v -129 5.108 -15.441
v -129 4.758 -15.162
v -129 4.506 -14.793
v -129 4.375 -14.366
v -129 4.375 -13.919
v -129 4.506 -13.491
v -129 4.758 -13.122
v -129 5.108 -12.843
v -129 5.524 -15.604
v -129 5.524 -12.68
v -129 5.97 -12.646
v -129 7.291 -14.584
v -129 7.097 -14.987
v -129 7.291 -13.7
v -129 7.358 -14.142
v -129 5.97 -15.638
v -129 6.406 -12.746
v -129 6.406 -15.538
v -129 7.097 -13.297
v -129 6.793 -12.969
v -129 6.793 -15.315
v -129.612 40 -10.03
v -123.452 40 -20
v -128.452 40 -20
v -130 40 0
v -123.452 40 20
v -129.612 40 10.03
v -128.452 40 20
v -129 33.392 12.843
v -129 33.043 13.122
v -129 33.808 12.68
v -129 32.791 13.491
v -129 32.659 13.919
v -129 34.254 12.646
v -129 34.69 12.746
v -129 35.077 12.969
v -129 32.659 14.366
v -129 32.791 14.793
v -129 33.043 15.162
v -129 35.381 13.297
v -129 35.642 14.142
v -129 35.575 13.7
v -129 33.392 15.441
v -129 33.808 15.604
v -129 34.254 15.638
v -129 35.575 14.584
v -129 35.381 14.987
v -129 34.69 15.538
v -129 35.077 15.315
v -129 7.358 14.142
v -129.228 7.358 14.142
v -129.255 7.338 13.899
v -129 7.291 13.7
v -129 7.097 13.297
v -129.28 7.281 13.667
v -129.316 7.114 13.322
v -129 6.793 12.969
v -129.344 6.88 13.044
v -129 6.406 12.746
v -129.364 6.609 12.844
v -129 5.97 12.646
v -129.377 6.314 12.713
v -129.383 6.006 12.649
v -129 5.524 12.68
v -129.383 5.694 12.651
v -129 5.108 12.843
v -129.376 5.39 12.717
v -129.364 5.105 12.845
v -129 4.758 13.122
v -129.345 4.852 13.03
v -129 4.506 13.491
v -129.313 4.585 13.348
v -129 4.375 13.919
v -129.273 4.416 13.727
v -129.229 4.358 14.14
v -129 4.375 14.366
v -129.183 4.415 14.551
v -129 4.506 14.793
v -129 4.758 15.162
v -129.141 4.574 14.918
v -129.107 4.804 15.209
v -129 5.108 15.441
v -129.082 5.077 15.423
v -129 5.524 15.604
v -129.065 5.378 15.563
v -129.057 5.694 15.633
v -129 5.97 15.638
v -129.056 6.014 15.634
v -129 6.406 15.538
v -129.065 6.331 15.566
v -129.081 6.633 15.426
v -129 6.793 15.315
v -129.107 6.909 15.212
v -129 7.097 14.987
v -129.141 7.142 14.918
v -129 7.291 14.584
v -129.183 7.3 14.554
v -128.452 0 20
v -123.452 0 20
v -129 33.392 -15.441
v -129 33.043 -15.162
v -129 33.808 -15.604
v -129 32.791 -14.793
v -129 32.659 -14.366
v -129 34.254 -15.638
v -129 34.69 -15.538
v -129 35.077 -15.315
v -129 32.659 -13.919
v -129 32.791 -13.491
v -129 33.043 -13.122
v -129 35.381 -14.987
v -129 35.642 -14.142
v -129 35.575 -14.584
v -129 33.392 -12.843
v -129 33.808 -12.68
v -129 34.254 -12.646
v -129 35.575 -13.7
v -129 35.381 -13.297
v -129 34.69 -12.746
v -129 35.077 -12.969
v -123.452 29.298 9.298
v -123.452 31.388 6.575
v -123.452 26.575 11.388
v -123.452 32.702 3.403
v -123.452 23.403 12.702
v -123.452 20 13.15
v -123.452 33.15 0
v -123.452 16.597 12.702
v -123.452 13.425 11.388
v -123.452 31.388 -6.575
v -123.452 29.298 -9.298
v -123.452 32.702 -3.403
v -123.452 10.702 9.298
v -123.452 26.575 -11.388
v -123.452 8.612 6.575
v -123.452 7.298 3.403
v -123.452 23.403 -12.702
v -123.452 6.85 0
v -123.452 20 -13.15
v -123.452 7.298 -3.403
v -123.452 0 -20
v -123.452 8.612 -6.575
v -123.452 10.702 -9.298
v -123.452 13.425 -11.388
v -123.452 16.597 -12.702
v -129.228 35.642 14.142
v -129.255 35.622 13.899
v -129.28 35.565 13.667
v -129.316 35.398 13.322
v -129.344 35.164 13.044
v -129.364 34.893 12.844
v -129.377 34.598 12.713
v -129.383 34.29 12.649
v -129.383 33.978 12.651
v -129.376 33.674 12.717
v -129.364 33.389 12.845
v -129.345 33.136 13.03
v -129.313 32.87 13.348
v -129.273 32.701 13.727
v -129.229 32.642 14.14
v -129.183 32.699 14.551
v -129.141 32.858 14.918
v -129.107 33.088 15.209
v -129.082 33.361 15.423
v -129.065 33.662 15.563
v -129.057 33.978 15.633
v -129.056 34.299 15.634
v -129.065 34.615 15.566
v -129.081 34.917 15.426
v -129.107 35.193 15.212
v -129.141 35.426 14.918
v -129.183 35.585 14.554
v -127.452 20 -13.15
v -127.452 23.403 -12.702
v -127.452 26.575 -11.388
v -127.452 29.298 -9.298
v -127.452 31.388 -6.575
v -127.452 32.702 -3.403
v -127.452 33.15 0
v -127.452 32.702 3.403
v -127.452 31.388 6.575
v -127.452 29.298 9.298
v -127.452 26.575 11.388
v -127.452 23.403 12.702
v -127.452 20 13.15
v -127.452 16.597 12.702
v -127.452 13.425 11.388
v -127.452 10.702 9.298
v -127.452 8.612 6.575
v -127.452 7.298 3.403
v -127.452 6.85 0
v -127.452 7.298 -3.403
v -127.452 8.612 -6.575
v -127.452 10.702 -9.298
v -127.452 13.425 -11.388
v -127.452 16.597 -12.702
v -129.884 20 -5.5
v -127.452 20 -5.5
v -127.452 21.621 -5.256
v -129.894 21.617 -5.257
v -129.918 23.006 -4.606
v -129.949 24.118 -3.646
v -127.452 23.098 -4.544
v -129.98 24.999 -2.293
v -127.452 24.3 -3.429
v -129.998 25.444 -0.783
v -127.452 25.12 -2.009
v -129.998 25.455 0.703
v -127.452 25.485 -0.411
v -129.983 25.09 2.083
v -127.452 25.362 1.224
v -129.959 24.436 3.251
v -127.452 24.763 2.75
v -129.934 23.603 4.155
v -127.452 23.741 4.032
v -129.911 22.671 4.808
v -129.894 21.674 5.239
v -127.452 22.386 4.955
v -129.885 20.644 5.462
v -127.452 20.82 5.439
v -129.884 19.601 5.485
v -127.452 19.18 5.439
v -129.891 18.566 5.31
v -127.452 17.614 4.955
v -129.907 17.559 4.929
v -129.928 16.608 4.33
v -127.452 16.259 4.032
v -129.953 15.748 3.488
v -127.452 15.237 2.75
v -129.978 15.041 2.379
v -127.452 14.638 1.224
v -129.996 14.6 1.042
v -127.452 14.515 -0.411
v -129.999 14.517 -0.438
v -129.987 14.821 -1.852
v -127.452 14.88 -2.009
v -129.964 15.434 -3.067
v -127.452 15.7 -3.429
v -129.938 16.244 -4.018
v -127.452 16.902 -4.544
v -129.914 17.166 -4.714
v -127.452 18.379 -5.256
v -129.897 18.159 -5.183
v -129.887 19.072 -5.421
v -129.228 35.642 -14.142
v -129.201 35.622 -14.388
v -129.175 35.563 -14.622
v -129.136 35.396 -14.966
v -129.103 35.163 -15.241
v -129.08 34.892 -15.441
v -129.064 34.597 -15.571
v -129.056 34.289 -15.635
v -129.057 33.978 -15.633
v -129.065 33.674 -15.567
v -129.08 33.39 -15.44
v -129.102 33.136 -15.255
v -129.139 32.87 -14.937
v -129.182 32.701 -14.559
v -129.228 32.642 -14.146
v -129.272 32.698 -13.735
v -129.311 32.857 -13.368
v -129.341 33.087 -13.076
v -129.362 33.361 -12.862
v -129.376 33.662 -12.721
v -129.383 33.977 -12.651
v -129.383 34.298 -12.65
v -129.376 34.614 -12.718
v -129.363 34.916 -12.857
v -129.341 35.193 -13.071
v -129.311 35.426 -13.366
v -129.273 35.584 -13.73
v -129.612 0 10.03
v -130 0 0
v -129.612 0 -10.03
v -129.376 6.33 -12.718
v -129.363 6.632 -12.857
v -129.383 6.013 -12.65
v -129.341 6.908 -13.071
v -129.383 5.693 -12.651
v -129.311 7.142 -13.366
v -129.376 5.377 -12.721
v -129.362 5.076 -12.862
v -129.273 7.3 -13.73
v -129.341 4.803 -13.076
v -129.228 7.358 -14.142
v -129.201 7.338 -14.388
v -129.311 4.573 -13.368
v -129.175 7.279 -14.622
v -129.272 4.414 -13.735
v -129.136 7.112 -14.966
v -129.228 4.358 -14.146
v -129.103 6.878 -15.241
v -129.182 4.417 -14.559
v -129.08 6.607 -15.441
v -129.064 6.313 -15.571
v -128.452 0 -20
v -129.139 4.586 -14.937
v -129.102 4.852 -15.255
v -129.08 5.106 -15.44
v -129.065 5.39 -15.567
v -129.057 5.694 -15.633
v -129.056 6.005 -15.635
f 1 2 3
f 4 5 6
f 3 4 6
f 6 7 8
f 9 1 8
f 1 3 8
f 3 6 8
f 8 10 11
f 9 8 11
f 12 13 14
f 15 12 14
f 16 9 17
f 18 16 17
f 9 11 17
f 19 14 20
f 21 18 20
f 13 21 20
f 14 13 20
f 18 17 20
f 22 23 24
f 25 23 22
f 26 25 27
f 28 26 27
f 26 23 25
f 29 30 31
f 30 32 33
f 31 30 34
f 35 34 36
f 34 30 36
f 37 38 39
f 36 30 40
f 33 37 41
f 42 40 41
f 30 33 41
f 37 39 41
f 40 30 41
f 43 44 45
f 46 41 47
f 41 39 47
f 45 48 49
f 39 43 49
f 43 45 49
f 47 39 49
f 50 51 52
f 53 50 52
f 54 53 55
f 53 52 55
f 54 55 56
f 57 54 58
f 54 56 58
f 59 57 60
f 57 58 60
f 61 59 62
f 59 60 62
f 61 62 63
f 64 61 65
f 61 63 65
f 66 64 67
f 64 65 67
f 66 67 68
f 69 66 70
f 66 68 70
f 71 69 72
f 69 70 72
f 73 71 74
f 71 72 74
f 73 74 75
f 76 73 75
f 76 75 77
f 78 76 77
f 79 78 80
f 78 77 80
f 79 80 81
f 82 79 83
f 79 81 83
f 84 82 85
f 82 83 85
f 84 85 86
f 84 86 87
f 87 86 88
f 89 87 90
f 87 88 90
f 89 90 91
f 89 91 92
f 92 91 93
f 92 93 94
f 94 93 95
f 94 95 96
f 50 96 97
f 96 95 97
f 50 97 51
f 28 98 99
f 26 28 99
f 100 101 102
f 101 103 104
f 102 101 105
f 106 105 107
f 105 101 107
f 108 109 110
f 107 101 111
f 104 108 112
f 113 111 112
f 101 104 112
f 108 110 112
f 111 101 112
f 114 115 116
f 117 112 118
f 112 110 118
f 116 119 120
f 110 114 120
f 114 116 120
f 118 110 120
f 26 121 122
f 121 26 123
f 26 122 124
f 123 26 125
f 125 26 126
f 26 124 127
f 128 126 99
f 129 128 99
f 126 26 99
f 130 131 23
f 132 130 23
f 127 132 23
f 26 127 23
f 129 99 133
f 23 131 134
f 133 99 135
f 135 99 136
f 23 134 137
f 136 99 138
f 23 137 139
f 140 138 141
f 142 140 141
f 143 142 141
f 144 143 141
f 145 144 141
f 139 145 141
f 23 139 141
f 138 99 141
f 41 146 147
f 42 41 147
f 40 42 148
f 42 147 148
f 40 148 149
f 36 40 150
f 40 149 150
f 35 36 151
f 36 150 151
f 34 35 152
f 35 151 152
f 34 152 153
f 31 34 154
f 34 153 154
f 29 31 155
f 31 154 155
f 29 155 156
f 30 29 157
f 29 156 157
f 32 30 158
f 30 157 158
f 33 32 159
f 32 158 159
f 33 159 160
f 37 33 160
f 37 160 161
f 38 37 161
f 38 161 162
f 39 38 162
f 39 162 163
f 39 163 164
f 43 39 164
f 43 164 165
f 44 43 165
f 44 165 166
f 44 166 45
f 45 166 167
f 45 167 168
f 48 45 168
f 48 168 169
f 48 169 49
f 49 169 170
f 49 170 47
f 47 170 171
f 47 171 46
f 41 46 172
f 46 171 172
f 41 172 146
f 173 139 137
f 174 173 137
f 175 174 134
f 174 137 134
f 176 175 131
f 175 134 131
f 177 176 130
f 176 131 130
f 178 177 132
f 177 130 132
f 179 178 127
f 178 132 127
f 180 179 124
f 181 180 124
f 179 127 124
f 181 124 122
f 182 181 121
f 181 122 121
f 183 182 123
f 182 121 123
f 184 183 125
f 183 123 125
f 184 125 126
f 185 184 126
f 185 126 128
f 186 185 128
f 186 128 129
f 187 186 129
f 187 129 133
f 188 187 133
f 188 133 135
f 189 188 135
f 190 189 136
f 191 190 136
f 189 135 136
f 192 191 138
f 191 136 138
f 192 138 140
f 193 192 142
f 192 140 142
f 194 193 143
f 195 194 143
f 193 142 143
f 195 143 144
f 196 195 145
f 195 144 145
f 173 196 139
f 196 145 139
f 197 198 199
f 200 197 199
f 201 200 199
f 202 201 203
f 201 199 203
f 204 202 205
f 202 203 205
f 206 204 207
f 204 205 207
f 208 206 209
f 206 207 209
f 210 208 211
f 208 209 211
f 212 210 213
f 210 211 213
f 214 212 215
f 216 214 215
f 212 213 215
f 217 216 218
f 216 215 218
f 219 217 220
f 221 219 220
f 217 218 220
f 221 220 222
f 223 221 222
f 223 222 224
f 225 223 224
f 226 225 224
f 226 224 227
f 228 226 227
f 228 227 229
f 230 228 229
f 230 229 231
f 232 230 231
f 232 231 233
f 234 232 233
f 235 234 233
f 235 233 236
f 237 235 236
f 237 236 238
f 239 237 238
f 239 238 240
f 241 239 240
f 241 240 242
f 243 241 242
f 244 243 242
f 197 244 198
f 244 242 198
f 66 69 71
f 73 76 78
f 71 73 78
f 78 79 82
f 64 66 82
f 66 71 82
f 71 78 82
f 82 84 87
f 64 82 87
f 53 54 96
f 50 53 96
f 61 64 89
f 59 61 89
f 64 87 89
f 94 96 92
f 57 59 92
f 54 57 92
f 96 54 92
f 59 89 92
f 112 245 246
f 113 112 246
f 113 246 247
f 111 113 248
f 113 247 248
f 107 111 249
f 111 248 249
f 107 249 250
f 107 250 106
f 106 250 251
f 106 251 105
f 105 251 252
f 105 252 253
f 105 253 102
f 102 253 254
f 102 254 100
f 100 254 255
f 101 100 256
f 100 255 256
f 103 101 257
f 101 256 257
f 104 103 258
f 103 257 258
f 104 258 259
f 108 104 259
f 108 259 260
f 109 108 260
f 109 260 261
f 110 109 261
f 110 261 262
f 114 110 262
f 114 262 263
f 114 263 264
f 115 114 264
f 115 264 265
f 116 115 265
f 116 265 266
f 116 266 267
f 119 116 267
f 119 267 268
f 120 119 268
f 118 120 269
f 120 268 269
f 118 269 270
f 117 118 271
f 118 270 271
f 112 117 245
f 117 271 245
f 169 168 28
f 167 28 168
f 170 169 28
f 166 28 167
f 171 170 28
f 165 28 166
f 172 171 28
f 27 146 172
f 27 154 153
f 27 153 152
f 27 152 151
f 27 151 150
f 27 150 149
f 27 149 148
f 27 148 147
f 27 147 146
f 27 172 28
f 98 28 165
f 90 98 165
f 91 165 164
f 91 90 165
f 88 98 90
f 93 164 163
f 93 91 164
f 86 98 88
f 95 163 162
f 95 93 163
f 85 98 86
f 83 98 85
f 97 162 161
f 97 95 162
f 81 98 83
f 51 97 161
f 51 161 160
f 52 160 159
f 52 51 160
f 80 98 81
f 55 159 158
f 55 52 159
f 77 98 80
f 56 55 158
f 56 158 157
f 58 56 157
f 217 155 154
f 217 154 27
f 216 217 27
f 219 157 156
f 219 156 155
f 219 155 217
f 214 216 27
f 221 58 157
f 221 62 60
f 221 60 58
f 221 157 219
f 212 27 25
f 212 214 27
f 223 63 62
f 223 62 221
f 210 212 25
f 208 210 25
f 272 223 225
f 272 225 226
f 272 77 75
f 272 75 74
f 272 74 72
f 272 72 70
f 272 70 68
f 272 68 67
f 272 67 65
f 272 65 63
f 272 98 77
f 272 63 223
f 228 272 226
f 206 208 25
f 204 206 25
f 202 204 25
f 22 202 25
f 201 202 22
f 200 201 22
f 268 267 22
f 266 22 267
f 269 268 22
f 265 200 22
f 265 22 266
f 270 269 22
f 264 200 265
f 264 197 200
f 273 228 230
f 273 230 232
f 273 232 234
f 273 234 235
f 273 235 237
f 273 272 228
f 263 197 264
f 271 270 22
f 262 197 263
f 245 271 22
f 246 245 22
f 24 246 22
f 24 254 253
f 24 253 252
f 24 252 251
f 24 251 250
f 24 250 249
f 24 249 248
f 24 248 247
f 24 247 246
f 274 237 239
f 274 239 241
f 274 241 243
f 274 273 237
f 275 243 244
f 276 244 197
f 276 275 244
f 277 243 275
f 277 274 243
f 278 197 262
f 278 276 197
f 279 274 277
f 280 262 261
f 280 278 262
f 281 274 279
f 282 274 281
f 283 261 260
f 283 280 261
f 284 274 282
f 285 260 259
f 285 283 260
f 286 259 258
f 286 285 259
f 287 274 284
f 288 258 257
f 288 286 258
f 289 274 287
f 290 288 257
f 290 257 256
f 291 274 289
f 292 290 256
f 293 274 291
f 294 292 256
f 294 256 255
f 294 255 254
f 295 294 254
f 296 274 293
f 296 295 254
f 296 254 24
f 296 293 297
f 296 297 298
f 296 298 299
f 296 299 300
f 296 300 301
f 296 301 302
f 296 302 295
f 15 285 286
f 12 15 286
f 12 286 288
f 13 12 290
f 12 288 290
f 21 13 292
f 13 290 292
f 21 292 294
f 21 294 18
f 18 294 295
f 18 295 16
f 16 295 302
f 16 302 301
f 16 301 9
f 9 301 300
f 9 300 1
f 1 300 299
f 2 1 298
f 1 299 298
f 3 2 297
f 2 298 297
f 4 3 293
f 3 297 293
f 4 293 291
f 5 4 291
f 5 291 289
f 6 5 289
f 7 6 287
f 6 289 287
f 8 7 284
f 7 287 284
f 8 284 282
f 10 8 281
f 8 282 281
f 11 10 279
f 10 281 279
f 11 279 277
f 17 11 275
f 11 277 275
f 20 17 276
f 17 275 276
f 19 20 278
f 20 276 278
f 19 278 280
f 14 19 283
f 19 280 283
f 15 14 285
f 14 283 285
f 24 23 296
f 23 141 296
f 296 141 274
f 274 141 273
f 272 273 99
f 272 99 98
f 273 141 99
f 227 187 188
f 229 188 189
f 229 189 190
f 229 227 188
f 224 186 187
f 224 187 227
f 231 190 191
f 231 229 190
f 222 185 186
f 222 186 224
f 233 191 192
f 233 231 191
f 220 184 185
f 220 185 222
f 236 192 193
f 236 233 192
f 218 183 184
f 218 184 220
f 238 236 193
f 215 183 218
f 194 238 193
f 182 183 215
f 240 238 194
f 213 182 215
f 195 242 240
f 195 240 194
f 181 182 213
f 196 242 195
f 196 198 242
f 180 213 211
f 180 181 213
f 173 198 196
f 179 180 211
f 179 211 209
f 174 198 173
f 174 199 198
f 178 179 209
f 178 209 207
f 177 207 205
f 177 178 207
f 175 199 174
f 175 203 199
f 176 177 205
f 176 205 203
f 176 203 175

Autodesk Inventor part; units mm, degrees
ref_plane "XZ Plane" through (0, 0, 0) normal (0, 1, 0) x (-1, 0, 0)
ref_plane "XY Plane" through (0, 0, 0) normal (0, 0, 1) x (1, 0, 0)
sketch "Sketch1" plane through (0, 0, 0) normal (0, 1, 0) x (-1, 0, 0)
  arc A0 (128.4523, -20) -> (128.4523, 20) centre (0, 0) ccw
  line L0 (128.4523, 20) -> (123.4523, 20)
  line L1 (123.4523, 20) -> (123.4523, -20)
  line L2 (123.4523, -20) -> (128.4523, -20)
  point P0 (123.4523, 0)
  dimension "d0" = 130
  dimension "d1" = 40
  dimension "d2" = 5
extrude "Extrusion1" add sketch "Sketch1" along normal blind 40
sketch "Sketch2" plane through (-123.4523, 0, 20) normal (1, 0, 0) x (0, 0, -1)
  circle A0 centre (20, 20) radius 13.15
  line L0 (0, 0) -> (0, 40) projected
  line L1 (0, 0) -> (40, 0) projected
  point P0 (20, 0)
  point P1 (0, 20)
  point P2 (20, 0)
  dimension "d5" = 26.3
extrude "Extrusion2" cut sketch "Sketch2" against normal blind 4
sketch "Sketch3" plane through (-127.4523, 20, 0) normal (1, 0, 0) x (0, 0, -1)
  circle A0 centre (0, 0) radius 5.5
  point P0 (0, -20)
  dimension "d8" = 11
extrude "Extrusion3" cut sketch "Sketch3" against normal through all
ref_plane "Work Plane1" through (-130, 0, 0) normal (1, 0, 0) x (0, 1, 0)
sketch "Sketch4" plane through (-130, 0, 0) normal (1, 0, 0) x (0, 1, 0)
  circle A0 centre (34.1421, -14.1421) radius 1.5
  circle A1 centre (20, 0) radius 5.5 projected
  circle A2 centre (20, 0) radius 20 construction
  circle A3 centre (34.1421, 14.1421) radius 1.5
  circle A4 centre (5.8579, 14.1421) radius 1.5
  circle A5 centre (5.8579, -14.1421) radius 1.5
  line L0 (20, 0) -> (20, -24.623) construction
  line L1 (20, 0) -> (34.1421, -14.1421) construction
  point P0 (0, 0)
  dimension "d15" = 40
  dimension "d11" = 3
  dimension "d18" = 360
  dimension "d20" = 45
extrude "Extrusion4" cut sketch "Sketch4" along normal blind 1 contours A0 | A3 | A4 | A5
properties part number "shift_fixed_socket" material "Acetal Resin, White"
